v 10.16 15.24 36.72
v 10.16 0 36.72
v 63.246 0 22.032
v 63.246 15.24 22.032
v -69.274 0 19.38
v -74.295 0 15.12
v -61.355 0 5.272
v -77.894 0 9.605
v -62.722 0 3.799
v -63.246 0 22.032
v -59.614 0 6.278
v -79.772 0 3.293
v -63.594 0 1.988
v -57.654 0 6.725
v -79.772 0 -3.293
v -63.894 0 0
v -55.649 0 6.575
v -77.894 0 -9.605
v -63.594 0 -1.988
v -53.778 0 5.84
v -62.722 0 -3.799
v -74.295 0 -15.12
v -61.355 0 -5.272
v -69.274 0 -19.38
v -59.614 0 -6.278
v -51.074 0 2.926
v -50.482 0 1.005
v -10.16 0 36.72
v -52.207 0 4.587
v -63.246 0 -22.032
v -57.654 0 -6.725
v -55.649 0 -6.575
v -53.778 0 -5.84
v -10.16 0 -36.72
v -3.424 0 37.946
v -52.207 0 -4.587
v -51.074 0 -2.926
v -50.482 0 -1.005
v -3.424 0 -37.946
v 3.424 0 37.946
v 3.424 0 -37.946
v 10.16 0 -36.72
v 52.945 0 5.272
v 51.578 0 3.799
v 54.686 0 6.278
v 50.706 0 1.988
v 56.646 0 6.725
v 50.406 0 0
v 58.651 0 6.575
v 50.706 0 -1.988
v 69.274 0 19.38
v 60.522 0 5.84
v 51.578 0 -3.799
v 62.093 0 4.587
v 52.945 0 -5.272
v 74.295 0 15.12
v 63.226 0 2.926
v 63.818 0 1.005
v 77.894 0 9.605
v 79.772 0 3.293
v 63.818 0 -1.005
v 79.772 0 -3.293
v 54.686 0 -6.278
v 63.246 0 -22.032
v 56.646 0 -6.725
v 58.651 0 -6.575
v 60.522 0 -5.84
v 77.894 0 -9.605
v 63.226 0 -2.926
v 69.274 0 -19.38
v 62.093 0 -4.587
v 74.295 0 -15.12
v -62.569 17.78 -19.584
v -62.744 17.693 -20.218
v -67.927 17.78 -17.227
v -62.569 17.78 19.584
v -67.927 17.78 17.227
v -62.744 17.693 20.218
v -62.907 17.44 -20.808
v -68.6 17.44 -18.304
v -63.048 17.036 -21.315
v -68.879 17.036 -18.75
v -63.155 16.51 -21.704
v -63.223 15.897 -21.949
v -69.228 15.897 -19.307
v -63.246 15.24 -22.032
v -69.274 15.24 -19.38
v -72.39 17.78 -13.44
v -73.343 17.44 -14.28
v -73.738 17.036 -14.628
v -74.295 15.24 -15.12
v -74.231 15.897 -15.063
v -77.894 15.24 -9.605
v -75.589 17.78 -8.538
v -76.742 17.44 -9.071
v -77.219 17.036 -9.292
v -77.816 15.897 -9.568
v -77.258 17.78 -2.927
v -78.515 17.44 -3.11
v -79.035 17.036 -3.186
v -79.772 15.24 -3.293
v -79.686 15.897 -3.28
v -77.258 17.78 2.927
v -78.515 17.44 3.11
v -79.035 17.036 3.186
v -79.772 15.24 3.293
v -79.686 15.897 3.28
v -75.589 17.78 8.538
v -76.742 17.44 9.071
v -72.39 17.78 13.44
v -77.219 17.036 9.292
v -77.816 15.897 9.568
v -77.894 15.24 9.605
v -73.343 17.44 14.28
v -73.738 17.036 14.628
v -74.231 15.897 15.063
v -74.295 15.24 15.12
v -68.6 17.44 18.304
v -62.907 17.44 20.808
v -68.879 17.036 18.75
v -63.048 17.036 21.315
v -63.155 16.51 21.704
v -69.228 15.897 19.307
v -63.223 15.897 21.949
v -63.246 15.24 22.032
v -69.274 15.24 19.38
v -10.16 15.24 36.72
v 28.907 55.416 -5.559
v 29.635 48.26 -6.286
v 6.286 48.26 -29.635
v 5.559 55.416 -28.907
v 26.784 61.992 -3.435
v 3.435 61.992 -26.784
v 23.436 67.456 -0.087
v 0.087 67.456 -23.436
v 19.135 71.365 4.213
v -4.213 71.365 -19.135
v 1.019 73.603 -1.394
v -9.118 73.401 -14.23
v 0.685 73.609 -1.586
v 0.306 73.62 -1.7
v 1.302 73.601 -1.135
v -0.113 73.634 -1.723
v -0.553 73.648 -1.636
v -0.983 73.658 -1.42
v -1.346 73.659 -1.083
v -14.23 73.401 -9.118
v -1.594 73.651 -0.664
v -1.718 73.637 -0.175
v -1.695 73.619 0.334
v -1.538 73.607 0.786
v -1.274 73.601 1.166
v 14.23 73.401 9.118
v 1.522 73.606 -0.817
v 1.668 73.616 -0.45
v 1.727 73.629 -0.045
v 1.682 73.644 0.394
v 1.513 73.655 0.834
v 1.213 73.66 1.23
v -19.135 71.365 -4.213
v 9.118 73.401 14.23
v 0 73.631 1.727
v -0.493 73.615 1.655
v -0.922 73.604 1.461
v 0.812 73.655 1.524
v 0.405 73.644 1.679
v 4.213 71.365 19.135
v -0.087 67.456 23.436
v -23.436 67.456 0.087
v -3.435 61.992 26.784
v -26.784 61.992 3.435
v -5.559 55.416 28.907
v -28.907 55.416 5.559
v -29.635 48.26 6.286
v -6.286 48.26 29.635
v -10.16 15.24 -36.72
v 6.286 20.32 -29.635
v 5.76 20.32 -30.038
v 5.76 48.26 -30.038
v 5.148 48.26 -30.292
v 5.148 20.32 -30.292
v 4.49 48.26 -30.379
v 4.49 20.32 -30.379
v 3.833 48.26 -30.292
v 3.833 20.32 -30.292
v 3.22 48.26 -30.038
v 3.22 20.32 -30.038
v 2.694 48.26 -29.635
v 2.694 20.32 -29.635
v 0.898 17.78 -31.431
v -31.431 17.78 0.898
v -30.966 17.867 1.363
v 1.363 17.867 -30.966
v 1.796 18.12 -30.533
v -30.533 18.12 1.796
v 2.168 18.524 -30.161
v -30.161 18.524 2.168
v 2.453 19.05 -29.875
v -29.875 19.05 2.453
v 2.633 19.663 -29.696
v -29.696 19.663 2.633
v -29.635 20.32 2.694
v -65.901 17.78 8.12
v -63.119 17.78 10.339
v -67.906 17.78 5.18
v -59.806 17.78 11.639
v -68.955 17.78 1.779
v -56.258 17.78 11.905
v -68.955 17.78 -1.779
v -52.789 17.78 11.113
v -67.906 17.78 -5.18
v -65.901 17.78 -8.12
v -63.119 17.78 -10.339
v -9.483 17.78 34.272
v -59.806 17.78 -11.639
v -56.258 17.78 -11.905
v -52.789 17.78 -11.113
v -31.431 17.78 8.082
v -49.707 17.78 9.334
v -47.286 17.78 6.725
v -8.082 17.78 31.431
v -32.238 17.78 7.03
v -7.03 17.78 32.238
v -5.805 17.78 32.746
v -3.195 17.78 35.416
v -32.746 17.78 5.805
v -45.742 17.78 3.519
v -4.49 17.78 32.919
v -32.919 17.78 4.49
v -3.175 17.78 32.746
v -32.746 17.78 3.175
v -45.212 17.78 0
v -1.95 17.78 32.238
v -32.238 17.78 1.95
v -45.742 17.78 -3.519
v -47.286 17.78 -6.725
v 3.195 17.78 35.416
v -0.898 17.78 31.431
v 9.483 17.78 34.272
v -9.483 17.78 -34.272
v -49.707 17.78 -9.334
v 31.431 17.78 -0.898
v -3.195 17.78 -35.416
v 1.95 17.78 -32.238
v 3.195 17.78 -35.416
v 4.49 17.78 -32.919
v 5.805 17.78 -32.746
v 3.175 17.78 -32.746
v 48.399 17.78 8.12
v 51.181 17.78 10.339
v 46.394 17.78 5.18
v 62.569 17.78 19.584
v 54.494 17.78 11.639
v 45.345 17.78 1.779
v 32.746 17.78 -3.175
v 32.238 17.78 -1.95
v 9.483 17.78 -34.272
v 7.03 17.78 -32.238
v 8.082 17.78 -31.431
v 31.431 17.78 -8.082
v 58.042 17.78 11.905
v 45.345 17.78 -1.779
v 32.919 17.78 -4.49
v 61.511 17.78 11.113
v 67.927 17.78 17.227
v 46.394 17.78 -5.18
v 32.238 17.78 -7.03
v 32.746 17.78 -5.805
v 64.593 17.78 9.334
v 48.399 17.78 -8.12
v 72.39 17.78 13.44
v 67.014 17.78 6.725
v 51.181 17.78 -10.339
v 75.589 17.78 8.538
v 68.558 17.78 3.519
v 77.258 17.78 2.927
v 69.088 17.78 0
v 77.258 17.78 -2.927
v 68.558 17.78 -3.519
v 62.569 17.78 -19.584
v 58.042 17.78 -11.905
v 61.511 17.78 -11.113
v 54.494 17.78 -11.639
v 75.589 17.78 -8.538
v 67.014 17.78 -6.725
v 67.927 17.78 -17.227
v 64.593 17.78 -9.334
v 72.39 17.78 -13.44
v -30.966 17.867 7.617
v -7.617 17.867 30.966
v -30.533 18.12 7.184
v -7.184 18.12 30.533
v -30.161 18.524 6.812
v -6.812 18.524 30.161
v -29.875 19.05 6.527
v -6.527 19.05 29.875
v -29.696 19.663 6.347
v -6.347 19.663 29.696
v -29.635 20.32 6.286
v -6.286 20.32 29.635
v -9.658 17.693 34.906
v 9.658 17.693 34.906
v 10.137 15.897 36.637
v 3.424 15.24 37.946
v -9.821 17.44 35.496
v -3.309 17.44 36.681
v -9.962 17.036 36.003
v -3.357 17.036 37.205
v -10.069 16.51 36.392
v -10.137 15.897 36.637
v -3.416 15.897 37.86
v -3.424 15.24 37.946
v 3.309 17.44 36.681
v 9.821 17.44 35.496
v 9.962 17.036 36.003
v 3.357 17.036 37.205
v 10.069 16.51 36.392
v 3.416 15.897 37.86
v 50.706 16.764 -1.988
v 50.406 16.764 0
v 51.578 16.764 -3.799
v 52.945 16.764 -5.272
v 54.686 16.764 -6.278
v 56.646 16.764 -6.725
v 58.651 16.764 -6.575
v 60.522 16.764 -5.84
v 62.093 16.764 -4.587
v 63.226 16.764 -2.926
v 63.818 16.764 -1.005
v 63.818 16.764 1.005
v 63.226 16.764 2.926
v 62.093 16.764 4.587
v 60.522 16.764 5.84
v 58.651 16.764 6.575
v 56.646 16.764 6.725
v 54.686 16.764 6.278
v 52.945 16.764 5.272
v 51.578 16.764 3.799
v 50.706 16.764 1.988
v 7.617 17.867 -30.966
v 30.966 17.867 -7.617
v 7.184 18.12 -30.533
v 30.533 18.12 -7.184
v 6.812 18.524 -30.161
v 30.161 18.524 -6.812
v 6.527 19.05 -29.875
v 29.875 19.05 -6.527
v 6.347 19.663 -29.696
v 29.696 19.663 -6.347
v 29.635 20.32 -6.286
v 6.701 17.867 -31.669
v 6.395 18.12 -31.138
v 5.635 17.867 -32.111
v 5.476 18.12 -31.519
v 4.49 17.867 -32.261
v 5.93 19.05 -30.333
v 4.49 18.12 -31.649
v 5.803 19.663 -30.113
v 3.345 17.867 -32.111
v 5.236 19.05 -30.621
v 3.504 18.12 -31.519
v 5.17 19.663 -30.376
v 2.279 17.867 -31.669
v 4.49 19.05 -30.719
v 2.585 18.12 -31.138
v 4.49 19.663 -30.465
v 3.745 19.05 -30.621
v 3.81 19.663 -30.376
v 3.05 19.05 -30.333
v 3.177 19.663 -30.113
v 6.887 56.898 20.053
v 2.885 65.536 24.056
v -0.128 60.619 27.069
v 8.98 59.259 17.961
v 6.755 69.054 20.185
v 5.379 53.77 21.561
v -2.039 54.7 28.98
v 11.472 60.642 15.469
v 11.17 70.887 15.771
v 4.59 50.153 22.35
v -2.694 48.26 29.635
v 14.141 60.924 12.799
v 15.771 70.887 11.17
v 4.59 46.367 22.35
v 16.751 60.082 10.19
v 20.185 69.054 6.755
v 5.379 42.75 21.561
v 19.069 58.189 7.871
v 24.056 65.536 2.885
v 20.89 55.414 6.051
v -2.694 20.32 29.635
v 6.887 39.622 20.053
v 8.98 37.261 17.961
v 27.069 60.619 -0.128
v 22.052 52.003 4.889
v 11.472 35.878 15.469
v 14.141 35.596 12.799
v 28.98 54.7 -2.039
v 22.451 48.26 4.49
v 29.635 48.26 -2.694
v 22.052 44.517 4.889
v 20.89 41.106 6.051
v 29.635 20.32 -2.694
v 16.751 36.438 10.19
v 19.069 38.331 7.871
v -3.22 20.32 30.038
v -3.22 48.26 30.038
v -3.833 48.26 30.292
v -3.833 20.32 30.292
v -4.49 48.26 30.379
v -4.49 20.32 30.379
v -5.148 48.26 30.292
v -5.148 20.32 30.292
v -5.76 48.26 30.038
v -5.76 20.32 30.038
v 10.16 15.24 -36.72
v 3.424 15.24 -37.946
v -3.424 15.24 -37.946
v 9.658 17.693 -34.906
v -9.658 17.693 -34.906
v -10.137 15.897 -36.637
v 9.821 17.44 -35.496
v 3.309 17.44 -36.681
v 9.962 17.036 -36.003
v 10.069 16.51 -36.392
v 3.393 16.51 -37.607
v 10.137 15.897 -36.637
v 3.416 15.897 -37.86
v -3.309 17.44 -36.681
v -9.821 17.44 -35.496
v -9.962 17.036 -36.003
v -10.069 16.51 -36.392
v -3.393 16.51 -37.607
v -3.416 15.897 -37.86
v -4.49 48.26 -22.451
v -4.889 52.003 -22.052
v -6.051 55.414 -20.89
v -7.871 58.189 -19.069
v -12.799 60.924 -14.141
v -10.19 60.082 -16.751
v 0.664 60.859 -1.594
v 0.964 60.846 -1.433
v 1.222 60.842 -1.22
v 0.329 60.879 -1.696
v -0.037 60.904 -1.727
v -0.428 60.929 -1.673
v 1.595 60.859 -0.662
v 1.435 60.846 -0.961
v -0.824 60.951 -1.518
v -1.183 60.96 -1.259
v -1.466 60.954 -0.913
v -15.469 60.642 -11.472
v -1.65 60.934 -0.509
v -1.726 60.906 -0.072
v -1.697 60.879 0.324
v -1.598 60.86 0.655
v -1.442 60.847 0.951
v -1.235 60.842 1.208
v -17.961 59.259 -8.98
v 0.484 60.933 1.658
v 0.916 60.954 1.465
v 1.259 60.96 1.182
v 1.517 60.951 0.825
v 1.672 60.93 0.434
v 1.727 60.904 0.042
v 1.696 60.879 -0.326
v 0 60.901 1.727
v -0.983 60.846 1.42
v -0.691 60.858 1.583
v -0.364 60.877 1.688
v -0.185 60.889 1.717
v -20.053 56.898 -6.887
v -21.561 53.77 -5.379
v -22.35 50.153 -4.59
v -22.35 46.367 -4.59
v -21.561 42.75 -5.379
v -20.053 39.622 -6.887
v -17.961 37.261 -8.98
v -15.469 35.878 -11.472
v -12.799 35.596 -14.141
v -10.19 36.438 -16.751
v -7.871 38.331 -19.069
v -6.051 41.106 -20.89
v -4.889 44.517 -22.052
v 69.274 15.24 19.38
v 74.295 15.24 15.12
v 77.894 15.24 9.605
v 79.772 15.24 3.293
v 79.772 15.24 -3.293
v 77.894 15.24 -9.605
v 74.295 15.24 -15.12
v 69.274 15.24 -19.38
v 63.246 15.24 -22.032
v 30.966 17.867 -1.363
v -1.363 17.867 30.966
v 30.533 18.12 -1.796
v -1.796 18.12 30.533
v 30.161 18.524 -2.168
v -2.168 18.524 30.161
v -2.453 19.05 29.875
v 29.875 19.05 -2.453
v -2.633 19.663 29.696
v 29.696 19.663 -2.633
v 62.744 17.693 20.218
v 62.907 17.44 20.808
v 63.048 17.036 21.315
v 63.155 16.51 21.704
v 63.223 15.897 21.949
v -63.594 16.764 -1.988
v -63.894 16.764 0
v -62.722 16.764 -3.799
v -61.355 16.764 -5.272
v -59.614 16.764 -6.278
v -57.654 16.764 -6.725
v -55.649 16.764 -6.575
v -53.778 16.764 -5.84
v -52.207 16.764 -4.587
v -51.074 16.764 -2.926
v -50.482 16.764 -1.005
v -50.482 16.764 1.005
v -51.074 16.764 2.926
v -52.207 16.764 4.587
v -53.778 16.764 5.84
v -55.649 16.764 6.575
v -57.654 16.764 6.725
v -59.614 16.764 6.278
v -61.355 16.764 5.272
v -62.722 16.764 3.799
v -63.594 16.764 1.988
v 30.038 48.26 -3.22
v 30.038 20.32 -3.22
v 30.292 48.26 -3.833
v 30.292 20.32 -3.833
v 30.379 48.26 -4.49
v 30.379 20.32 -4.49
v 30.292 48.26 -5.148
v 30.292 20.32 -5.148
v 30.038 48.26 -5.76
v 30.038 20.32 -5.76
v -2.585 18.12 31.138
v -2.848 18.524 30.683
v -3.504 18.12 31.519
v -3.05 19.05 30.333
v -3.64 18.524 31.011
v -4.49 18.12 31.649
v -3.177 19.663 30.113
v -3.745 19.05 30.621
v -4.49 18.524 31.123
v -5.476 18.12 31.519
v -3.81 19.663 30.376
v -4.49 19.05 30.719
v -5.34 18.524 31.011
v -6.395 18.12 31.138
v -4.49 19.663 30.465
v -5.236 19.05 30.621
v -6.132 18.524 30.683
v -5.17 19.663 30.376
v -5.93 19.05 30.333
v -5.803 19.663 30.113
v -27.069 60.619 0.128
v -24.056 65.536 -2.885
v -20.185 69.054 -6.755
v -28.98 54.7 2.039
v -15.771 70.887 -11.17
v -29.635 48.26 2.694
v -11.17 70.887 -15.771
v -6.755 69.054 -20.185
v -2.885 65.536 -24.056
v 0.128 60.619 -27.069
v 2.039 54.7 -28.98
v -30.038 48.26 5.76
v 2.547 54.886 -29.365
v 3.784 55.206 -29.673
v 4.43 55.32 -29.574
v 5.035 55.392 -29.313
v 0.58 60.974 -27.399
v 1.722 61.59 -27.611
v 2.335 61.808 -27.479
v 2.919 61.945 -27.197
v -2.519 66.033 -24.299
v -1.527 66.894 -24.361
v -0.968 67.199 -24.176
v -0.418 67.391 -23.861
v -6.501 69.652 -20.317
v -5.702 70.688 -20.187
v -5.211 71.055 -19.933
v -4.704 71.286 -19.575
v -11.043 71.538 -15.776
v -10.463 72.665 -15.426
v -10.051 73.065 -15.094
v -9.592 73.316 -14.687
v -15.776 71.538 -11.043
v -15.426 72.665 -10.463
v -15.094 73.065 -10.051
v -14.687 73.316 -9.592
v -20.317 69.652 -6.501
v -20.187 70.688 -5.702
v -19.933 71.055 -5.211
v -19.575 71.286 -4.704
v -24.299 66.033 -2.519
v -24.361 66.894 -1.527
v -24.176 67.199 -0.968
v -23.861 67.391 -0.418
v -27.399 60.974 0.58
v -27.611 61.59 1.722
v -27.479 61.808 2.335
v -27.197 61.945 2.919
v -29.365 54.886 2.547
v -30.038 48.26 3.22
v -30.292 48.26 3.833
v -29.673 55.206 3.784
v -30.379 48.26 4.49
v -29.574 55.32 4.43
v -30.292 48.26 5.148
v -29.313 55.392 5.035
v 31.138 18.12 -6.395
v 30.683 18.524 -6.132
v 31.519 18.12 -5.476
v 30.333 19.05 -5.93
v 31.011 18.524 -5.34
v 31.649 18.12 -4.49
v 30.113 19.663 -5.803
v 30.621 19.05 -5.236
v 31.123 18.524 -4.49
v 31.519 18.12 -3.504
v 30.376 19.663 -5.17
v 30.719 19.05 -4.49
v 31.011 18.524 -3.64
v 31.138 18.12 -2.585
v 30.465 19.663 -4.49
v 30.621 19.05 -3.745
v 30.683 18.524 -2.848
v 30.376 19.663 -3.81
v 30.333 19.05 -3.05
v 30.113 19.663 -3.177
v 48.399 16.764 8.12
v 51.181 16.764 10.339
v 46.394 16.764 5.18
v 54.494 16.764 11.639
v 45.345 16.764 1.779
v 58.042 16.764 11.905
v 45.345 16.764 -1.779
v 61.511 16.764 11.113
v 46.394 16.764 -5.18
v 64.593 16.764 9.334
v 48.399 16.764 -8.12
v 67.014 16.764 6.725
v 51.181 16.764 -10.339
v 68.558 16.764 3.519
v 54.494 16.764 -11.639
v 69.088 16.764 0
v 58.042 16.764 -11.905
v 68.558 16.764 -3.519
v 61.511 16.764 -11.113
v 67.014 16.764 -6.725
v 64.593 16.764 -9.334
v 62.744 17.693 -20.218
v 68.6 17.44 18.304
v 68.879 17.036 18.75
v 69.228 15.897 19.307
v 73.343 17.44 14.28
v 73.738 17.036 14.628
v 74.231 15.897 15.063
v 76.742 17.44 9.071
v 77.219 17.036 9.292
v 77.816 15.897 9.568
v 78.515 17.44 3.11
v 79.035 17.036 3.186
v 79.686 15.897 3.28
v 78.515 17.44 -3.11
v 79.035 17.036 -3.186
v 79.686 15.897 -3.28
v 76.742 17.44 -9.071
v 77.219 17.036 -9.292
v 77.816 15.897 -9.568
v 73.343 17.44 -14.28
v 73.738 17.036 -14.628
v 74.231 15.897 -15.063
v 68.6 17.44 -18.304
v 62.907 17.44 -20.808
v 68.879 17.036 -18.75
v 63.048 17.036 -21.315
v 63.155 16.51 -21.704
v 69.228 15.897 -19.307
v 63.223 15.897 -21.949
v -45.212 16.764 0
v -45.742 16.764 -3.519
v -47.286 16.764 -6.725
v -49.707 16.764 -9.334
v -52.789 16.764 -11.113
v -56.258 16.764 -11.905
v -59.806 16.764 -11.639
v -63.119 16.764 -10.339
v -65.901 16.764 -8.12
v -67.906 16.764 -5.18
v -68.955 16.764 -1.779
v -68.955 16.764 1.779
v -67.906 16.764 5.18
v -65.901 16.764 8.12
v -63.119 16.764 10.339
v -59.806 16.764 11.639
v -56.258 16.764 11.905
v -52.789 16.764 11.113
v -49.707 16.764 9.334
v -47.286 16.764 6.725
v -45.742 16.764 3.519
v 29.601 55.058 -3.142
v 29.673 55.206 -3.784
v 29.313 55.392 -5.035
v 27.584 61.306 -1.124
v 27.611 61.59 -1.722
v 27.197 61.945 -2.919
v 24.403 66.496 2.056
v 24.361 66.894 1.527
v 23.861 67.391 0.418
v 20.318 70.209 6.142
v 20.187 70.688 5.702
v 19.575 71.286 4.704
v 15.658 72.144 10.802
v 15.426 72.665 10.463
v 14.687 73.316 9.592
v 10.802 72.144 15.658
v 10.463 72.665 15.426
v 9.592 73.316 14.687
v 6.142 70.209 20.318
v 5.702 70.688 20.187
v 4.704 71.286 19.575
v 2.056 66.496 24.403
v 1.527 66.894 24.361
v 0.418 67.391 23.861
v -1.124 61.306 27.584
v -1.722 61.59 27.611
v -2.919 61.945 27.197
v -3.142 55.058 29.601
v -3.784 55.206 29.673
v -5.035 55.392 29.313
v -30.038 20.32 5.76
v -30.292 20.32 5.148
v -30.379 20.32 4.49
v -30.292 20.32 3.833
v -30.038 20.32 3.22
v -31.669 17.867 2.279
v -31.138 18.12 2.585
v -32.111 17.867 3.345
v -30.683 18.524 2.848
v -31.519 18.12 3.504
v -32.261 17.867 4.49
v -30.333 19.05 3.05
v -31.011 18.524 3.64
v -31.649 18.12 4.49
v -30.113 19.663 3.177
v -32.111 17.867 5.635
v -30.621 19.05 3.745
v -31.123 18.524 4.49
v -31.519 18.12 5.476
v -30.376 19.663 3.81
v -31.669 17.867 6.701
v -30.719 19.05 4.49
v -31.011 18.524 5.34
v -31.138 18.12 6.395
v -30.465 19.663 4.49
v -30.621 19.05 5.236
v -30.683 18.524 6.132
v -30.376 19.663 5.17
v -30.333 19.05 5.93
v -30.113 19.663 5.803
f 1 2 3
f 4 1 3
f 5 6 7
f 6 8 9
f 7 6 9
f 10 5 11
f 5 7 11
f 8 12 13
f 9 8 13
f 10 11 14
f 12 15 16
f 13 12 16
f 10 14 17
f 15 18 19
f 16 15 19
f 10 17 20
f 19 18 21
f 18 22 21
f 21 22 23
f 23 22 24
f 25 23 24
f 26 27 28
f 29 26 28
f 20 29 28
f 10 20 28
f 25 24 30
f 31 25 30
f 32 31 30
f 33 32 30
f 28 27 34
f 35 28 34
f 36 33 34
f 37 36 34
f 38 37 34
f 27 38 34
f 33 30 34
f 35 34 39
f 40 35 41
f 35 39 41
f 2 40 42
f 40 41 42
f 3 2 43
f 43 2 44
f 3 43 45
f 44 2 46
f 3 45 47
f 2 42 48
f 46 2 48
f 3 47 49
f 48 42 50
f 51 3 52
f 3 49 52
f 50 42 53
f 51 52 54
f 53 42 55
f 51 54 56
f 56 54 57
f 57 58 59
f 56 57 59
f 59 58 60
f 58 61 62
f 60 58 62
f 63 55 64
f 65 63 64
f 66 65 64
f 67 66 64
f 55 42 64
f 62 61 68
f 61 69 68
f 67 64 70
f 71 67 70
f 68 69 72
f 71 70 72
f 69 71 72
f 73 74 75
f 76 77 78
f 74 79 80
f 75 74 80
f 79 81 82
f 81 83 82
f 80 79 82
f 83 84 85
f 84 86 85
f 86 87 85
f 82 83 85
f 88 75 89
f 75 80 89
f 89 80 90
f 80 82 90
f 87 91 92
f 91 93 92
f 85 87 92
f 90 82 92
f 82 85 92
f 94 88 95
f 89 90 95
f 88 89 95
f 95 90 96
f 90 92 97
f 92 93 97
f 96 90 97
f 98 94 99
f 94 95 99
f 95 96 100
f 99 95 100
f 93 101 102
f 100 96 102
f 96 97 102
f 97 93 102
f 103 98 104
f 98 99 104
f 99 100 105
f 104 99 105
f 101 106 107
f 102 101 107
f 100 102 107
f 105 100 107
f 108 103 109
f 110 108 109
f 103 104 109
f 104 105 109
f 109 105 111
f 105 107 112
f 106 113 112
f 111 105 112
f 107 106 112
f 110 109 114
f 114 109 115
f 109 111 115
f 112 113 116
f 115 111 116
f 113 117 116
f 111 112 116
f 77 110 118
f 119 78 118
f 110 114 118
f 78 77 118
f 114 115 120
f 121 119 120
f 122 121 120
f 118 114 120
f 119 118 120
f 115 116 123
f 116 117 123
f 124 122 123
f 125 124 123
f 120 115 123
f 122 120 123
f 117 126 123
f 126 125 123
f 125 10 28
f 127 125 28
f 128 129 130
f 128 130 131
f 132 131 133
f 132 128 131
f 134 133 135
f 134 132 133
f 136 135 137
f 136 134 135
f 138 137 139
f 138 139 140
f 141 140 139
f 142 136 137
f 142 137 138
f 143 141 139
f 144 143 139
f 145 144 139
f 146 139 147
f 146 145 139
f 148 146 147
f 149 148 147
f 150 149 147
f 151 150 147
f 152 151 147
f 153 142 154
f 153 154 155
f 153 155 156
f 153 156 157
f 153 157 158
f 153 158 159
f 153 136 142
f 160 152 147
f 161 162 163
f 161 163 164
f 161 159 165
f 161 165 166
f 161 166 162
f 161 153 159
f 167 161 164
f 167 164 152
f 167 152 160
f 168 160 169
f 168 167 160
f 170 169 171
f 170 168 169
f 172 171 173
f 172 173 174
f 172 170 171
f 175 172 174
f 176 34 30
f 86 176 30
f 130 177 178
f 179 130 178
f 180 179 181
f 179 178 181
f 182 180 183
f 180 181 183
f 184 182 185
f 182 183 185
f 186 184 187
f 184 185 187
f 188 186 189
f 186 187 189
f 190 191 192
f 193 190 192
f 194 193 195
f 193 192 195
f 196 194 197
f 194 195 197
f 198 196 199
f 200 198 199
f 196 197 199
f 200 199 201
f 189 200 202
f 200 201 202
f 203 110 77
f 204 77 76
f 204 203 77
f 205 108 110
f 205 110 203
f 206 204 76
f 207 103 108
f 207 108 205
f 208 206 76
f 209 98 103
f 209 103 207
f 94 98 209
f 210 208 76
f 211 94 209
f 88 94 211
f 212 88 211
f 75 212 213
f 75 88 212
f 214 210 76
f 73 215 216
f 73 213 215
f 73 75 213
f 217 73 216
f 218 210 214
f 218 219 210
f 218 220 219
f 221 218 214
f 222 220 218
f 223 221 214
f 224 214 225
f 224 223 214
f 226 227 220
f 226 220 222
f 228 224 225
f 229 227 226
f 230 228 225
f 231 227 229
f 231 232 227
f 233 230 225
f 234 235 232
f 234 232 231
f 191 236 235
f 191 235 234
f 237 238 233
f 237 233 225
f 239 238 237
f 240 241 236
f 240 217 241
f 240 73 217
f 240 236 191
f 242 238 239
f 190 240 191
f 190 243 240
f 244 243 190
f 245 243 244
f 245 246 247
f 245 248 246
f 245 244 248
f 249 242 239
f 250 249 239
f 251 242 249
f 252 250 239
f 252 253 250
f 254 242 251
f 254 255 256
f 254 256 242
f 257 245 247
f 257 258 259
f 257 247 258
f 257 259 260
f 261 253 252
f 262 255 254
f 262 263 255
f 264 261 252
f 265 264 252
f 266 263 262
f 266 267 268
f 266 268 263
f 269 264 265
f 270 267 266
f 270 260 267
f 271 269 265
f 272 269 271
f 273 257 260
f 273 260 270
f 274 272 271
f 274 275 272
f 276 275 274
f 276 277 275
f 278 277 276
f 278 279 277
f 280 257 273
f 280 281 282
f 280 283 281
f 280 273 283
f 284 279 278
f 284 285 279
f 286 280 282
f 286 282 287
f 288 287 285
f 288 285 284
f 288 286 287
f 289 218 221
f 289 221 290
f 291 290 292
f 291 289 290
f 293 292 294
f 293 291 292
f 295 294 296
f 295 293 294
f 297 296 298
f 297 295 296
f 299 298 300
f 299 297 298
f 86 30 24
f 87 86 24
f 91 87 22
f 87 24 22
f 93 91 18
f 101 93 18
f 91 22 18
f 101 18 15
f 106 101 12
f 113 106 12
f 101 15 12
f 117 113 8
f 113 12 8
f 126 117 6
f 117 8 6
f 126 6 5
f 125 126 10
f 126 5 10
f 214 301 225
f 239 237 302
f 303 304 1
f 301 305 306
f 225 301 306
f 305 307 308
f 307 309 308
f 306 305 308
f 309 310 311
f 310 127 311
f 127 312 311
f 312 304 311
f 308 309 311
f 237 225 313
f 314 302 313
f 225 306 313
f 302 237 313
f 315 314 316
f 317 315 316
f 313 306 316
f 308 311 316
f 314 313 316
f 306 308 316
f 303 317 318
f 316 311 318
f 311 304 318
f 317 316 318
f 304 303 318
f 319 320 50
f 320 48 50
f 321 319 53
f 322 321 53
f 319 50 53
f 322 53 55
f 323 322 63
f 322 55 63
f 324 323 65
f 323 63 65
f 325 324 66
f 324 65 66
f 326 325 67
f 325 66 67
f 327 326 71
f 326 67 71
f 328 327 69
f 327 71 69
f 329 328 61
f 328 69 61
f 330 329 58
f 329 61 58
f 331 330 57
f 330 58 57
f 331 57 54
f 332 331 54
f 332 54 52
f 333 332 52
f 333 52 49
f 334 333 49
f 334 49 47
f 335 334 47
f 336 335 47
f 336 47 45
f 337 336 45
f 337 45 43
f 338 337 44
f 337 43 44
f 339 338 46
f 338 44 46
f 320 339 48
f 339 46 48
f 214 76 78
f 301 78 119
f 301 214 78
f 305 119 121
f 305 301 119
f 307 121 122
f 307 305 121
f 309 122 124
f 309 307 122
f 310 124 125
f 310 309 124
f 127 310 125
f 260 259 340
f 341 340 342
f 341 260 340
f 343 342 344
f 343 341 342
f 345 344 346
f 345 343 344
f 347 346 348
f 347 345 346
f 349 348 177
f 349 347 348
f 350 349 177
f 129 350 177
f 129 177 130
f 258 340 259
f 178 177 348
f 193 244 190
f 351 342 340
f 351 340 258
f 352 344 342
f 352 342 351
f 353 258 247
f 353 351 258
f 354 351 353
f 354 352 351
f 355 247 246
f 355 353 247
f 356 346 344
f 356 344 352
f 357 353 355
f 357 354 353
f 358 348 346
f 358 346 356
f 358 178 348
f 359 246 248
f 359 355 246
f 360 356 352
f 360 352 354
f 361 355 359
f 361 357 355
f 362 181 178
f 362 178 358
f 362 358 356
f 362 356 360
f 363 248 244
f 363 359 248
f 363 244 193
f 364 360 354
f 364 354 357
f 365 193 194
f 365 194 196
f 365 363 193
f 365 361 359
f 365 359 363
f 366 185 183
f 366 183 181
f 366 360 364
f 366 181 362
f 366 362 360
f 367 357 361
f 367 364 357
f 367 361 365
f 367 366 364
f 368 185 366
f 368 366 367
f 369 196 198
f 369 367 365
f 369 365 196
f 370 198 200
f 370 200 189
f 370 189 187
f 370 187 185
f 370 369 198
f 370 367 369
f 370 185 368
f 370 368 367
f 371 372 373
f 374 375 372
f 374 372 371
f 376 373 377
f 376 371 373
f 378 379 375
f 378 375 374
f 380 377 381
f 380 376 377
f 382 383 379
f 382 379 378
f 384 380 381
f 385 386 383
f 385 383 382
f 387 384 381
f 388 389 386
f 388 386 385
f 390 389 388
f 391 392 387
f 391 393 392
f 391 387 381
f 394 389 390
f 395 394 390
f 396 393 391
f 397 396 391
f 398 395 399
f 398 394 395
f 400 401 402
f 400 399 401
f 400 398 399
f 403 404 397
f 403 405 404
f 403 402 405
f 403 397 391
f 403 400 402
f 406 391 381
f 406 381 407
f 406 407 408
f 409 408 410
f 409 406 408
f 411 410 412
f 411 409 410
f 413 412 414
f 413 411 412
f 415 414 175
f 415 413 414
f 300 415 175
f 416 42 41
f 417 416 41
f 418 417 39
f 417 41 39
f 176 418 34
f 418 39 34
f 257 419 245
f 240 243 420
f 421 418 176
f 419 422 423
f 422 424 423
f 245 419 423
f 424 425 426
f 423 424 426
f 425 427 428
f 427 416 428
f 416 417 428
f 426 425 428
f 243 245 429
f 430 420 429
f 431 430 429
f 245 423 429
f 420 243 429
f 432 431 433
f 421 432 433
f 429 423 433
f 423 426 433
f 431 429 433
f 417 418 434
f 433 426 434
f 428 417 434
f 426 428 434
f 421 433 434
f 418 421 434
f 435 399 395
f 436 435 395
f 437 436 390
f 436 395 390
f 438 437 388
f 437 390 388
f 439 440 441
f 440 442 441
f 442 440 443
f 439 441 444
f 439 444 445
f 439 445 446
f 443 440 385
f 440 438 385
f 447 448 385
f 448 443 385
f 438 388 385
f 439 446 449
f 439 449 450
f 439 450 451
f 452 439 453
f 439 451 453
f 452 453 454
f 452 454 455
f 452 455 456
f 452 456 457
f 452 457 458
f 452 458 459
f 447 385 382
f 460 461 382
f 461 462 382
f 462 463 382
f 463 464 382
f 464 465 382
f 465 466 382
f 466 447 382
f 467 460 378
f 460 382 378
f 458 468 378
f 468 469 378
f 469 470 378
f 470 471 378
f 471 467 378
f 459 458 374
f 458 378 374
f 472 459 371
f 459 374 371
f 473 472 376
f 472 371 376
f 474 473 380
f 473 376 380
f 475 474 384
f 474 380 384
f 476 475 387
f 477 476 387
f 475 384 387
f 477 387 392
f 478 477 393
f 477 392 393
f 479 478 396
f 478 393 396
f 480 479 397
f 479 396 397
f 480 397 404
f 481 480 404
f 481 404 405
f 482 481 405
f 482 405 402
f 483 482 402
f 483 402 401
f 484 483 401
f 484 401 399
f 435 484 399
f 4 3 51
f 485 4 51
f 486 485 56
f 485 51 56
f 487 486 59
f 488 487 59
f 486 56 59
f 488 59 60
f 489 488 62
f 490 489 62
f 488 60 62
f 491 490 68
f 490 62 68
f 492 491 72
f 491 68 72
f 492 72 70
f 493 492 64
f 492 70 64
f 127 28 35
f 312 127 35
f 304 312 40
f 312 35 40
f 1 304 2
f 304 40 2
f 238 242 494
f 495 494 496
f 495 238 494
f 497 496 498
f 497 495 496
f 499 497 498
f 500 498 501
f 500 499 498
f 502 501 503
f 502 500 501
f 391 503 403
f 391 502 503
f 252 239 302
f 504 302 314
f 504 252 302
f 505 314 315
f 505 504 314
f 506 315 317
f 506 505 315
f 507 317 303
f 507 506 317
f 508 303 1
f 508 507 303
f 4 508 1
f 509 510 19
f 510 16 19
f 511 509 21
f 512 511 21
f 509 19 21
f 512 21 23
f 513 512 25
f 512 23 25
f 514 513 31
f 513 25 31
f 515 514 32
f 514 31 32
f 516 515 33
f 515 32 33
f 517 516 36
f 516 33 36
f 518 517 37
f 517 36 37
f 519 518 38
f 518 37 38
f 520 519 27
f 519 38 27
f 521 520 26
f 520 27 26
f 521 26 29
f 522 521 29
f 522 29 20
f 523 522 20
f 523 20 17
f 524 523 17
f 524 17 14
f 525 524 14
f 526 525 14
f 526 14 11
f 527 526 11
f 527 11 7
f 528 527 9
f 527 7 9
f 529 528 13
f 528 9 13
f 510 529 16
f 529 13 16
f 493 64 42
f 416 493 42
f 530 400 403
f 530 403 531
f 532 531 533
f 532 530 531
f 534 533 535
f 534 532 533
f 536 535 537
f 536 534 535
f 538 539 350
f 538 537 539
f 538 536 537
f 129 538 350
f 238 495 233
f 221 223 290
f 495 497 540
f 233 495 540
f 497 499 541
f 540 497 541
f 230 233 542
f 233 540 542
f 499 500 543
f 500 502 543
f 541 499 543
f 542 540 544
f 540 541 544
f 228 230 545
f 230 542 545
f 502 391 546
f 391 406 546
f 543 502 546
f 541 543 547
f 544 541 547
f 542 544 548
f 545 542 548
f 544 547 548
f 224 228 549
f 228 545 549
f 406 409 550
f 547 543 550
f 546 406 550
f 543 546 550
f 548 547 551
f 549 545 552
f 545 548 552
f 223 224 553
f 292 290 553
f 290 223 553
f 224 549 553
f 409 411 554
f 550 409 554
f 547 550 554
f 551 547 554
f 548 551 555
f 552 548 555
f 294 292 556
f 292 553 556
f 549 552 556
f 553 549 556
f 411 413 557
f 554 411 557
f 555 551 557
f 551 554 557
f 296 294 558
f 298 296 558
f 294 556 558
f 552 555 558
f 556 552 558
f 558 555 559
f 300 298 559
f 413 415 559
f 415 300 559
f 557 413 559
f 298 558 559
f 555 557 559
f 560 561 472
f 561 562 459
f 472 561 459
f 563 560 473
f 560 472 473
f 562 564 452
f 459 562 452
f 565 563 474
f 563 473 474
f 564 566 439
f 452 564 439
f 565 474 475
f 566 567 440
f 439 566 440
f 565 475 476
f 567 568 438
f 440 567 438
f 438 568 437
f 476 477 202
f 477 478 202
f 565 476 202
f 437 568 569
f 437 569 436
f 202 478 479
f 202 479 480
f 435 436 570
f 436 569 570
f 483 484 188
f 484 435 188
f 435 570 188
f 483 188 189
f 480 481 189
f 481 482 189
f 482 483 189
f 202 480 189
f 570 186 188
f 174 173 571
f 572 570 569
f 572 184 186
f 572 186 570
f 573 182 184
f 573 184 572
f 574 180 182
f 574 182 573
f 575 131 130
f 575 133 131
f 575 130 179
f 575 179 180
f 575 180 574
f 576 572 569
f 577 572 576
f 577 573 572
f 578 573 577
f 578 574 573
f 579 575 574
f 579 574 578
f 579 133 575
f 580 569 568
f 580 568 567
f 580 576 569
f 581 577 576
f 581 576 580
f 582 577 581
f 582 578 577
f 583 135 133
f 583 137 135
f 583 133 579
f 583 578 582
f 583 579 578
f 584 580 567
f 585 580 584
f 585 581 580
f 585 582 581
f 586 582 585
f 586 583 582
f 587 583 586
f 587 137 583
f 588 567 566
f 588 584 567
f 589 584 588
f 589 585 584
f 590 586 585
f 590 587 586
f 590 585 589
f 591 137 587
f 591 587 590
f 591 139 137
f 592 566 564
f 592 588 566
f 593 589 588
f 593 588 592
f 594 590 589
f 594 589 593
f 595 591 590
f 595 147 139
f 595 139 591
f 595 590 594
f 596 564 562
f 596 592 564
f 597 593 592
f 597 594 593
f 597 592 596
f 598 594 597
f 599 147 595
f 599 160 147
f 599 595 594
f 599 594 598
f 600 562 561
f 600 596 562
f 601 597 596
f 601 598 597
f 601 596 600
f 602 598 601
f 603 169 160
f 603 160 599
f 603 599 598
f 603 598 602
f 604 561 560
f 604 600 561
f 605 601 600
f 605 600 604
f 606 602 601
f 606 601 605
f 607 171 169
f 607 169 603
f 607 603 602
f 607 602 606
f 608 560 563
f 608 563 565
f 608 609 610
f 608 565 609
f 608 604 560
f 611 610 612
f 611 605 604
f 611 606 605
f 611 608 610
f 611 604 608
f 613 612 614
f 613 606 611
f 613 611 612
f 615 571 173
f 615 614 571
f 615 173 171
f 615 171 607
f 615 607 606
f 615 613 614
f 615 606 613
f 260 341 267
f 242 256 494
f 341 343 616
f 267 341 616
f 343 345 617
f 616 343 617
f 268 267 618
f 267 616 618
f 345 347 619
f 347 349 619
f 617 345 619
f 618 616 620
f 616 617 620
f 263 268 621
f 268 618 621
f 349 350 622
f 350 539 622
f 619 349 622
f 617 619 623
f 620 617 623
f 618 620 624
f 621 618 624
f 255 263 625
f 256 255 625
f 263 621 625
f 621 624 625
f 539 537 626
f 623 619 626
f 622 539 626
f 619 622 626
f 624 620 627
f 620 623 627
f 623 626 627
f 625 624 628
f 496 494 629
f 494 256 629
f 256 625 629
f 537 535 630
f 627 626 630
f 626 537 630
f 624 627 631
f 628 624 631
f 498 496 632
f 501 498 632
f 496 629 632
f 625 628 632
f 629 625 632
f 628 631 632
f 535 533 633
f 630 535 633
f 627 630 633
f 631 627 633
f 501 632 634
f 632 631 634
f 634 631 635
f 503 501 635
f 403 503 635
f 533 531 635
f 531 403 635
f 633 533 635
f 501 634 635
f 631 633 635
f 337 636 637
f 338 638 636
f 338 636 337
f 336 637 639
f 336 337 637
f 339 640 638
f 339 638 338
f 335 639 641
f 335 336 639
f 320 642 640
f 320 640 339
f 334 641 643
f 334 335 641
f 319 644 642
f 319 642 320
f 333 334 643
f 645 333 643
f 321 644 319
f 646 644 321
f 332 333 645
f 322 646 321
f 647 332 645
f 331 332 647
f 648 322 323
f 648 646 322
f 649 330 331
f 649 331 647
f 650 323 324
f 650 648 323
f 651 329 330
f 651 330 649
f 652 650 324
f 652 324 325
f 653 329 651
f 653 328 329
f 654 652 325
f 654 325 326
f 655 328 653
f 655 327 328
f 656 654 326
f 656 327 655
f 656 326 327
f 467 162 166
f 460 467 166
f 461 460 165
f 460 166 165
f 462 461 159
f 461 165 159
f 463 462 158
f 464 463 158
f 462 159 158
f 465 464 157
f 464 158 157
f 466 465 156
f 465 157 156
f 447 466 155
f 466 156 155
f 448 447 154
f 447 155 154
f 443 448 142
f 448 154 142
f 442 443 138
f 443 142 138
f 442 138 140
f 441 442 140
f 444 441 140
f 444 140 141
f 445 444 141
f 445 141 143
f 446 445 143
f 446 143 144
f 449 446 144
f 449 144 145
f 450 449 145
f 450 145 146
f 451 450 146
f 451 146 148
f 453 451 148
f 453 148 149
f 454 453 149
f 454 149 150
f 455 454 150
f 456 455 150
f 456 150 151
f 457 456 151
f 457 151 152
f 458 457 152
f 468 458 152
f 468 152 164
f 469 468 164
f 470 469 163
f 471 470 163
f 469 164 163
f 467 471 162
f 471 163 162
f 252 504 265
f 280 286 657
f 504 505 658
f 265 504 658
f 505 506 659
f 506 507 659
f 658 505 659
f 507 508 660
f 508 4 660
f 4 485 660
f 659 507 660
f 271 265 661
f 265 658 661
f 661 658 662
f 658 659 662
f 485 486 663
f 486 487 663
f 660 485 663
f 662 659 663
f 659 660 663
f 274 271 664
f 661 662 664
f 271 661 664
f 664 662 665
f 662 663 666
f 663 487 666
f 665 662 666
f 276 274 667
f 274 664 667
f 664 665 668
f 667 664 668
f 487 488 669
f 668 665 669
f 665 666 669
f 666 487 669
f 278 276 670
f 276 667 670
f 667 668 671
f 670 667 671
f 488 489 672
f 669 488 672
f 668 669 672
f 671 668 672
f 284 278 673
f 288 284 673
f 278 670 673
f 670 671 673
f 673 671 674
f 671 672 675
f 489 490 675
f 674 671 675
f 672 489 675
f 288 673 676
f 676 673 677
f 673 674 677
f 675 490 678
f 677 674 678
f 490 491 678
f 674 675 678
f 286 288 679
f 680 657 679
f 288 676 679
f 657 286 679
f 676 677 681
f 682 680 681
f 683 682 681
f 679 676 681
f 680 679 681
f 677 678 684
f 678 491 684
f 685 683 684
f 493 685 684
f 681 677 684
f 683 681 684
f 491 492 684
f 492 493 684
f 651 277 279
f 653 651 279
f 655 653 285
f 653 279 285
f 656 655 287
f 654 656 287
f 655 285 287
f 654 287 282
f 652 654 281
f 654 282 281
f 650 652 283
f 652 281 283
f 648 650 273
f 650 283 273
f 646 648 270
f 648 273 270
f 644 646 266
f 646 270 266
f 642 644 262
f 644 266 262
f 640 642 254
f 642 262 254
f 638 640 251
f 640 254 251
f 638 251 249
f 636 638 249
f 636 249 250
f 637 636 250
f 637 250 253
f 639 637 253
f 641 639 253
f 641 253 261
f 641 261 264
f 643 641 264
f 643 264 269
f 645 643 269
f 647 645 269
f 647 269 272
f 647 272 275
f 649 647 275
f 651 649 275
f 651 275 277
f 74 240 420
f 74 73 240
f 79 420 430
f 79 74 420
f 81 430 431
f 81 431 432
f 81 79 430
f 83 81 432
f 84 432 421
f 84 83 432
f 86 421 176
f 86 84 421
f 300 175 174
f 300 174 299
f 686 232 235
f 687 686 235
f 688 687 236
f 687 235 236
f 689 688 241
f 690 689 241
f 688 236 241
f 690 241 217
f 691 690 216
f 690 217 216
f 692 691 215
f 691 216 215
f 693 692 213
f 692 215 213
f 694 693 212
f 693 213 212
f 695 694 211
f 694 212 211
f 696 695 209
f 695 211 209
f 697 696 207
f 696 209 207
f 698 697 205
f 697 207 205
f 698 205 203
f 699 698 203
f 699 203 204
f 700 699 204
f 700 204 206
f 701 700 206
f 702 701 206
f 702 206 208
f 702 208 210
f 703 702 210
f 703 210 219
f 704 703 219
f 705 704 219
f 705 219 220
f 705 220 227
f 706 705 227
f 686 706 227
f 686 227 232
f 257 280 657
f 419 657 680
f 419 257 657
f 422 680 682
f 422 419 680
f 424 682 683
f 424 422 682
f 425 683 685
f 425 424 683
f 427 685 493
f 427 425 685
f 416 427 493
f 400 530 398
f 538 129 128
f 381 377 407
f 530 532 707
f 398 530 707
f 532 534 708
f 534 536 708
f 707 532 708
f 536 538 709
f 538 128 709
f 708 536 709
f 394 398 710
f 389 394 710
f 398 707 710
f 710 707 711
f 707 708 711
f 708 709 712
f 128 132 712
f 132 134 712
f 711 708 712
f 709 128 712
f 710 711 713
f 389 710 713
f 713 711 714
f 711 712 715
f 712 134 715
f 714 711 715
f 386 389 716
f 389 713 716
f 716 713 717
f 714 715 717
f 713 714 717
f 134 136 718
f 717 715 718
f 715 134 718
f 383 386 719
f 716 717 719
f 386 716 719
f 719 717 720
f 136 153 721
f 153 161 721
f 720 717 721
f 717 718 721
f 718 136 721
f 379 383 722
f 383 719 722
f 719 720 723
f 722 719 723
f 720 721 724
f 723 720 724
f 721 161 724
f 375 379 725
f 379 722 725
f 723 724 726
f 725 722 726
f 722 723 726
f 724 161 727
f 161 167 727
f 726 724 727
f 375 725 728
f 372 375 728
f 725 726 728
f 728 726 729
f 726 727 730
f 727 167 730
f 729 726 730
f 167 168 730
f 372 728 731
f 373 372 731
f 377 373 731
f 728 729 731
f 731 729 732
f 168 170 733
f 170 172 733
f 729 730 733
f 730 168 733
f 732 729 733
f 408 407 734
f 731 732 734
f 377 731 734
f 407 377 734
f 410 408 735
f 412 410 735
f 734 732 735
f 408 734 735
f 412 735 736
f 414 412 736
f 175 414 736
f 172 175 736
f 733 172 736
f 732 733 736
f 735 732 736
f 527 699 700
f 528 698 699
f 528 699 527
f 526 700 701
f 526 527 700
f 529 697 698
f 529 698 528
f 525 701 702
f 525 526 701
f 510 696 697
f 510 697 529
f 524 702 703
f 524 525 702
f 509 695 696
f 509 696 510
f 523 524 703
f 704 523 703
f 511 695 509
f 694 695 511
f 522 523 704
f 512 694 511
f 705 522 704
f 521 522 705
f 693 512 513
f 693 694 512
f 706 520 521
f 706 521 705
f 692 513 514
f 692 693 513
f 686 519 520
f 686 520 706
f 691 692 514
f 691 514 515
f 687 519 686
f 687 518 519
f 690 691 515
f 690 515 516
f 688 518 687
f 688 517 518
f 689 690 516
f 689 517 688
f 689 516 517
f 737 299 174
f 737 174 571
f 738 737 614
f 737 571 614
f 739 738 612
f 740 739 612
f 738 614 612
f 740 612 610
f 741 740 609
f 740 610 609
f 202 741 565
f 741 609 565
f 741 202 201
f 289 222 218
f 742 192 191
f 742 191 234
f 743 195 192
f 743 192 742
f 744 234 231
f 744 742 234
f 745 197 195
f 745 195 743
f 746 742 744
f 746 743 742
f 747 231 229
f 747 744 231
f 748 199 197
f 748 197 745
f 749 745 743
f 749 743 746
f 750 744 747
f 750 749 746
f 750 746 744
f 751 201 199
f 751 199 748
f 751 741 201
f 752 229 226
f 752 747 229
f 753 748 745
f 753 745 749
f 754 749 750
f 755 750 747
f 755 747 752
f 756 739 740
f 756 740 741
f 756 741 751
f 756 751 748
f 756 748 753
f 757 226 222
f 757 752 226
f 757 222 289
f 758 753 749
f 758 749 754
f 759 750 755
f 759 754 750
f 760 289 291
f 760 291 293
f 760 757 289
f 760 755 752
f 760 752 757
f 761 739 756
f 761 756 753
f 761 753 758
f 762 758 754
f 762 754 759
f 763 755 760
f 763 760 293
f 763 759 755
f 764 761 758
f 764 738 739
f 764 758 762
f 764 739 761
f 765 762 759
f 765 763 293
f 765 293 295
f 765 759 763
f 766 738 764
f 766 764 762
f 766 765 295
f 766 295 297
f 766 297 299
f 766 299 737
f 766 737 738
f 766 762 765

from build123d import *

# Parameters (mm, degrees)
BOSS_EXTRUDE1_DEPTH                                 = 17.78
CBORE_FOR_00_BINDING_HEAD_MACHINE_SCREW_D           = 13.4874
CBORE_FOR_00_BINDING_HEAD_MACHINE_SCREW_CBORE_D     = 23.876
CBORE_FOR_00_BINDING_HEAD_MACHINE_SCREW_CBORE_DEPTH = 1.016
BOSS_EXTRUDE3_DEPTH                                 = 19.05
SKETCH10_R                                          = 12.7
CUT_EXTRUDE1_DEPTH                                  = 19.05
F_29_0_136_DIAMETER_HOLE1_REACH                     = 117.235
F_29_0_136_DIAMETER_HOLE1_BORE_R                    = 1.7272
FILLET1_R                                           = 2.54
FILLET2_R                                           = 2.54
FILLET3_R                                           = 2.54
FILLET4_R                                           = 2.54
FILLET5_START                                       = -22.86
FILLET5_3_DEPTH                                     = 45.72


with BuildPart() as part:
    # Sketch1 → Boss-Extrude1 (new body)
    with BuildSketch(Plane(origin=(0, 0, 0), x_dir=(1, 0, 0), z_dir=(0, 1, 0))):
        with BuildLine():
            Line((63.246, 22.032212417), (10.16, 36.720354029))
            ThreePointArc((10.16, 36.720354029), (0, 38.1), (-10.16, 36.720354029))
            Line((-10.16, 36.720354029), (-63.246, 22.032212417))
            ThreePointArc((-63.246, 22.032212417), (-80.01, 0), (-63.246, -22.032212417))
            Line((-63.246, -22.032212417), (-10.16, -36.720354029))
            ThreePointArc((-10.16, -36.720354029), (0, -38.1), (10.16, -36.720354029))
            Line((10.16, -36.720354029), (63.246, -22.032212417))
            ThreePointArc((63.246, -22.032212417), (80.01, 0), (63.246, 22.032212417))
        make_face()
    extrude(amount=BOSS_EXTRUDE1_DEPTH)

    # CBORE for #00 Binding Head Machine Screw2 (through all)
    with Locations(Plane(origin=(0, 17.78, 0), x_dir=(1, 0, 0), z_dir=(0, 1, 0))):
        with Locations((-57.15, 0), (57.15, 0)):
            CounterBoreHole(CBORE_FOR_00_BINDING_HEAD_MACHINE_SCREW_D / 2, CBORE_FOR_00_BINDING_HEAD_MACHINE_SCREW_CBORE_D / 2, CBORE_FOR_00_BINDING_HEAD_MACHINE_SCREW_CBORE_DEPTH)

    # Sketch7 → Boss-Extrude3 (add, symmetric)
    with BuildSketch(Plane(origin=(0, 0, 0), x_dir=(0, -1, 0), z_dir=(0.7071067811865464, 0, 0.7071067811865488))):
        with BuildLine():
            Line((-48.26, -25.4), (-17.78, -25.4))
            Line((-17.78, -25.4), (-17.78, 25.4))
            Line((-17.78, 25.4), (-48.26, 25.4))
            ThreePointArc((-48.26, 25.4), (-73.66, 0), (-48.26, -25.4))
        make_face()
    extrude(amount=BOSS_EXTRUDE3_DEPTH, both=True)

    # Sketch10 → Cut-Extrude1 (cut, symmetric)
    with BuildSketch(Plane(origin=(0, 0, 0), x_dir=(0, -1, 0), z_dir=(0.7071067811865464, 0, 0.7071067811865488))):
        with Locations(Location((-48.26, 0, 0), (0, 0, 90))):
            Circle(SKETCH10_R)
    extrude(amount=CUT_EXTRUDE1_DEPTH, both=True, mode=Mode.SUBTRACT)

    # #29 (0.136) Diameter Hole1 bore (on position points) → #29 (0.136) Diameter Hole1 (cut, up to next)
    with BuildSketch(Plane.ZX.offset(73.66), mode=Mode.PRIVATE) as f_29_0_136_diameter_hole1_sk1:
        Circle(F_29_0_136_DIAMETER_HOLE1_BORE_R)
    f_29_0_136_diameter_hole1_tool1 = extrude(f_29_0_136_diameter_hole1_sk1.sketch, amount=-F_29_0_136_DIAMETER_HOLE1_REACH, mode=Mode.PRIVATE) & part.part
    add(f_29_0_136_diameter_hole1_tool1.solids().sort_by_distance((0, 73.66, 0))[0], mode=Mode.SUBTRACT)

    # Fillet1
    fillet1_edges = [part.edges().sort_by_distance(p)[0] for p in [
        (-36.703, 17.78, -29.376283223),
        (-80.01, 17.78, 0),
        (-36.703, 17.78, 29.376283223),
        (0, 17.78, 38.1),
        (36.703, 17.78, 29.376283223),
        (80.01, 17.78, 0),
        (36.703, 17.78, -29.376283223),
        (0, 17.78, -38.1),
    ]]
    fillet(fillet1_edges, radius=FILLET1_R)

    # Fillet2
    fillet2_edges = [part.edges().sort_by_distance(p)[0] for p in [
        (31.430896424, 33.02, -4.490128061),
        (-4.490128061, 33.02, 31.430896424),
        (13.470384182, 73.66, 13.470384182),
    ]]
    fillet(fillet2_edges, radius=FILLET2_R)

    # Fillet3
    fillet3_edges = [part.edges().sort_by_distance(p)[0] for p in [
        (17.06248663, 17.78, -18.858537854),
        (13.470384182, 17.78, 13.470384182),
        (-18.858537854, 17.78, 17.06248663),
        (30.378793975, 17.78, -4.490128061),
        (-4.490128061, 17.78, 30.378793975),
    ]]
    fillet(fillet3_edges, radius=FILLET3_R)

    # Fillet4
    # the kernel refuses this fillet: 2.54 mm, written as the material it takes off along each edge
    with BuildSketch(Plane(origin=(-33.226947648, 20.32, 6.286179285), x_dir=(-0.4226145849074772, 0.8017442392976469, 0.42261458490747583), z_dir=(0.5669187883846173, 0.5976672776328292, -0.5669187883846153))) as fillet4_piece_1_section:
        with BuildLine():
            CenterArc((2.54 + FILLET4_R, FILLET4_R), FILLET4_R, 180, 90)
            Line((2.54, FILLET4_R), (2.54, 0))
            Line((2.54, 0), (2.54 + FILLET4_R, 0))
        make_face()
    fillet4_piece_1 = revolve(axis=Axis((-33.226947648, 20.32, 6.286179285), (0.7071067811865464, 0, 0.7071067811865488)), revolution_arc=233.296989237, mode=Mode.PRIVATE)
    fillet4_piece_1 = split(fillet4_piece_1, bisect_by=Plane(origin=(-33.226947648, 17.78, 6.286179285), z_dir=(0, 1, 0)), keep=Keep.TOP, mode=Mode.PRIVATE)
    add(fillet4_piece_1, mode=Mode.SUBTRACT)
    with BuildSketch(Plane(origin=(6.286179285, 20.32, -33.226947648), x_dir=(0.4226145849074753, 0.8017442392976486, -0.42261458490747456), z_dir=(-0.5669187883846184, 0.597667277632827, 0.5669187883846165))) as fillet4_piece_2_section:
        with BuildLine():
            CenterArc((2.54 + FILLET4_R, -FILLET4_R), FILLET4_R, 90, 90)
            Line((2.54, -FILLET4_R), (2.54, 0))
            Line((2.54, 0), (2.54 + FILLET4_R, 0))
        make_face()
    fillet4_piece_2 = revolve(axis=Axis((6.286179285, 20.32, -33.226947648), (-0.7071067811865464, 0, -0.7071067811865488)), revolution_arc=233.296989237, mode=Mode.PRIVATE)
    fillet4_piece_2 = split(fillet4_piece_2, bisect_by=Plane(origin=(6.286179285, 17.78, -33.226947648), z_dir=(0, 1, 0)), keep=Keep.TOP, mode=Mode.PRIVATE)
    add(fillet4_piece_2, mode=Mode.SUBTRACT)
    with BuildSketch(Plane(origin=(-31.430896424, 48.26, 4.490128061), x_dir=(0.7071067811865488, 0, -0.7071067811865462), z_dir=(0, -1, 0)), Plane(origin=(4.490128061, 20.32, -31.430896424), x_dir=(-0.707106781186549, 0, 0.7071067811865461), z_dir=(0, 1, 0))) as fillet4_piece_3:
        with BuildLine():
            CenterArc((FILLET4_R, FILLET4_R), FILLET4_R, 180, 90)
            Line((0, FILLET4_R), (0, 0))
            Line((0, 0), (FILLET4_R, 0))
        make_face()
    extrude(amount=27.94, mode=Mode.SUBTRACT)
    with BuildSketch(Plane(origin=(-13.470384182, 48.26, -13.470384182), x_dir=(0.7071067811865487, 0, -0.7071067811865464), z_dir=(0, -1, 0))) as fillet4_piece_4:
        with BuildLine():
            CenterArc((25.4 - FILLET4_R, FILLET4_R), FILLET4_R, 270, 90)
            Line((25.4, FILLET4_R), (25.4, 0))
            Line((25.4, 0), (25.4 - FILLET4_R, 0))
        make_face()
    revolve(axis=Axis((-13.470384182, 48.26, -13.470384182), (0.7071067811865464, 0, 0.7071067811865488)), revolution_arc=180, mode=Mode.SUBTRACT)

    # Fillet5: read off the stored shape, not the designer's step
    # Fillet5 outline → Fillet5 (revolve)
    with BuildSketch(Plane(origin=(-27.838793975, 0, 4.490128061), x_dir=(1, 0, 0), z_dir=(0, 0, 1))):
        with BuildLine():
            ThreePointArc((5.08, 17.78), (3.283948776, 18.523948776), (2.54, 20.32))
            Line((2.54, 20.32), (2.54, 17.78))
            Line((2.54, 17.78), (5.08, 17.78))
        make_face()
    revolve(axis=Axis((-27.838793975, 0, 4.490128061), (0, 1, 0)))

    # Fillet5 2 outline → Fillet5 2 (revolve)
    with BuildSketch(Plane(origin=(4.490128061, 0, -27.838793975), x_dir=(1, 0, 0), z_dir=(0, 0, 1))):
        with BuildLine():
            ThreePointArc((5.08, 17.78), (3.283948776, 18.523948776), (2.54, 20.32))
            Line((2.54, 20.32), (2.54, 17.78))
            Line((2.54, 17.78), (5.08, 17.78))
        make_face()
    revolve(axis=Axis((4.490128061, 0, -27.838793975), (0, 1, 0)))

    # Fillet5 3 outline → Fillet5 3 (add)
    with BuildSketch(Plane(origin=(0, 0, 0), x_dir=(0.707106781186546, 0, 0.707106781186549), z_dir=(0.707106781186549, 0, -0.707106781186546)).offset(FILLET5_START)):
        with BuildLine():
            ThreePointArc((-21.59, -17.78), (-19.793948776, -18.523948776), (-19.05, -20.32))
            Line((-19.05, -20.32), (-19.05, -17.78))
            Line((-19.05, -17.78), (-21.59, -17.78))
        make_face()
    extrude(amount=FILLET5_3_DEPTH)


solid = part.part
